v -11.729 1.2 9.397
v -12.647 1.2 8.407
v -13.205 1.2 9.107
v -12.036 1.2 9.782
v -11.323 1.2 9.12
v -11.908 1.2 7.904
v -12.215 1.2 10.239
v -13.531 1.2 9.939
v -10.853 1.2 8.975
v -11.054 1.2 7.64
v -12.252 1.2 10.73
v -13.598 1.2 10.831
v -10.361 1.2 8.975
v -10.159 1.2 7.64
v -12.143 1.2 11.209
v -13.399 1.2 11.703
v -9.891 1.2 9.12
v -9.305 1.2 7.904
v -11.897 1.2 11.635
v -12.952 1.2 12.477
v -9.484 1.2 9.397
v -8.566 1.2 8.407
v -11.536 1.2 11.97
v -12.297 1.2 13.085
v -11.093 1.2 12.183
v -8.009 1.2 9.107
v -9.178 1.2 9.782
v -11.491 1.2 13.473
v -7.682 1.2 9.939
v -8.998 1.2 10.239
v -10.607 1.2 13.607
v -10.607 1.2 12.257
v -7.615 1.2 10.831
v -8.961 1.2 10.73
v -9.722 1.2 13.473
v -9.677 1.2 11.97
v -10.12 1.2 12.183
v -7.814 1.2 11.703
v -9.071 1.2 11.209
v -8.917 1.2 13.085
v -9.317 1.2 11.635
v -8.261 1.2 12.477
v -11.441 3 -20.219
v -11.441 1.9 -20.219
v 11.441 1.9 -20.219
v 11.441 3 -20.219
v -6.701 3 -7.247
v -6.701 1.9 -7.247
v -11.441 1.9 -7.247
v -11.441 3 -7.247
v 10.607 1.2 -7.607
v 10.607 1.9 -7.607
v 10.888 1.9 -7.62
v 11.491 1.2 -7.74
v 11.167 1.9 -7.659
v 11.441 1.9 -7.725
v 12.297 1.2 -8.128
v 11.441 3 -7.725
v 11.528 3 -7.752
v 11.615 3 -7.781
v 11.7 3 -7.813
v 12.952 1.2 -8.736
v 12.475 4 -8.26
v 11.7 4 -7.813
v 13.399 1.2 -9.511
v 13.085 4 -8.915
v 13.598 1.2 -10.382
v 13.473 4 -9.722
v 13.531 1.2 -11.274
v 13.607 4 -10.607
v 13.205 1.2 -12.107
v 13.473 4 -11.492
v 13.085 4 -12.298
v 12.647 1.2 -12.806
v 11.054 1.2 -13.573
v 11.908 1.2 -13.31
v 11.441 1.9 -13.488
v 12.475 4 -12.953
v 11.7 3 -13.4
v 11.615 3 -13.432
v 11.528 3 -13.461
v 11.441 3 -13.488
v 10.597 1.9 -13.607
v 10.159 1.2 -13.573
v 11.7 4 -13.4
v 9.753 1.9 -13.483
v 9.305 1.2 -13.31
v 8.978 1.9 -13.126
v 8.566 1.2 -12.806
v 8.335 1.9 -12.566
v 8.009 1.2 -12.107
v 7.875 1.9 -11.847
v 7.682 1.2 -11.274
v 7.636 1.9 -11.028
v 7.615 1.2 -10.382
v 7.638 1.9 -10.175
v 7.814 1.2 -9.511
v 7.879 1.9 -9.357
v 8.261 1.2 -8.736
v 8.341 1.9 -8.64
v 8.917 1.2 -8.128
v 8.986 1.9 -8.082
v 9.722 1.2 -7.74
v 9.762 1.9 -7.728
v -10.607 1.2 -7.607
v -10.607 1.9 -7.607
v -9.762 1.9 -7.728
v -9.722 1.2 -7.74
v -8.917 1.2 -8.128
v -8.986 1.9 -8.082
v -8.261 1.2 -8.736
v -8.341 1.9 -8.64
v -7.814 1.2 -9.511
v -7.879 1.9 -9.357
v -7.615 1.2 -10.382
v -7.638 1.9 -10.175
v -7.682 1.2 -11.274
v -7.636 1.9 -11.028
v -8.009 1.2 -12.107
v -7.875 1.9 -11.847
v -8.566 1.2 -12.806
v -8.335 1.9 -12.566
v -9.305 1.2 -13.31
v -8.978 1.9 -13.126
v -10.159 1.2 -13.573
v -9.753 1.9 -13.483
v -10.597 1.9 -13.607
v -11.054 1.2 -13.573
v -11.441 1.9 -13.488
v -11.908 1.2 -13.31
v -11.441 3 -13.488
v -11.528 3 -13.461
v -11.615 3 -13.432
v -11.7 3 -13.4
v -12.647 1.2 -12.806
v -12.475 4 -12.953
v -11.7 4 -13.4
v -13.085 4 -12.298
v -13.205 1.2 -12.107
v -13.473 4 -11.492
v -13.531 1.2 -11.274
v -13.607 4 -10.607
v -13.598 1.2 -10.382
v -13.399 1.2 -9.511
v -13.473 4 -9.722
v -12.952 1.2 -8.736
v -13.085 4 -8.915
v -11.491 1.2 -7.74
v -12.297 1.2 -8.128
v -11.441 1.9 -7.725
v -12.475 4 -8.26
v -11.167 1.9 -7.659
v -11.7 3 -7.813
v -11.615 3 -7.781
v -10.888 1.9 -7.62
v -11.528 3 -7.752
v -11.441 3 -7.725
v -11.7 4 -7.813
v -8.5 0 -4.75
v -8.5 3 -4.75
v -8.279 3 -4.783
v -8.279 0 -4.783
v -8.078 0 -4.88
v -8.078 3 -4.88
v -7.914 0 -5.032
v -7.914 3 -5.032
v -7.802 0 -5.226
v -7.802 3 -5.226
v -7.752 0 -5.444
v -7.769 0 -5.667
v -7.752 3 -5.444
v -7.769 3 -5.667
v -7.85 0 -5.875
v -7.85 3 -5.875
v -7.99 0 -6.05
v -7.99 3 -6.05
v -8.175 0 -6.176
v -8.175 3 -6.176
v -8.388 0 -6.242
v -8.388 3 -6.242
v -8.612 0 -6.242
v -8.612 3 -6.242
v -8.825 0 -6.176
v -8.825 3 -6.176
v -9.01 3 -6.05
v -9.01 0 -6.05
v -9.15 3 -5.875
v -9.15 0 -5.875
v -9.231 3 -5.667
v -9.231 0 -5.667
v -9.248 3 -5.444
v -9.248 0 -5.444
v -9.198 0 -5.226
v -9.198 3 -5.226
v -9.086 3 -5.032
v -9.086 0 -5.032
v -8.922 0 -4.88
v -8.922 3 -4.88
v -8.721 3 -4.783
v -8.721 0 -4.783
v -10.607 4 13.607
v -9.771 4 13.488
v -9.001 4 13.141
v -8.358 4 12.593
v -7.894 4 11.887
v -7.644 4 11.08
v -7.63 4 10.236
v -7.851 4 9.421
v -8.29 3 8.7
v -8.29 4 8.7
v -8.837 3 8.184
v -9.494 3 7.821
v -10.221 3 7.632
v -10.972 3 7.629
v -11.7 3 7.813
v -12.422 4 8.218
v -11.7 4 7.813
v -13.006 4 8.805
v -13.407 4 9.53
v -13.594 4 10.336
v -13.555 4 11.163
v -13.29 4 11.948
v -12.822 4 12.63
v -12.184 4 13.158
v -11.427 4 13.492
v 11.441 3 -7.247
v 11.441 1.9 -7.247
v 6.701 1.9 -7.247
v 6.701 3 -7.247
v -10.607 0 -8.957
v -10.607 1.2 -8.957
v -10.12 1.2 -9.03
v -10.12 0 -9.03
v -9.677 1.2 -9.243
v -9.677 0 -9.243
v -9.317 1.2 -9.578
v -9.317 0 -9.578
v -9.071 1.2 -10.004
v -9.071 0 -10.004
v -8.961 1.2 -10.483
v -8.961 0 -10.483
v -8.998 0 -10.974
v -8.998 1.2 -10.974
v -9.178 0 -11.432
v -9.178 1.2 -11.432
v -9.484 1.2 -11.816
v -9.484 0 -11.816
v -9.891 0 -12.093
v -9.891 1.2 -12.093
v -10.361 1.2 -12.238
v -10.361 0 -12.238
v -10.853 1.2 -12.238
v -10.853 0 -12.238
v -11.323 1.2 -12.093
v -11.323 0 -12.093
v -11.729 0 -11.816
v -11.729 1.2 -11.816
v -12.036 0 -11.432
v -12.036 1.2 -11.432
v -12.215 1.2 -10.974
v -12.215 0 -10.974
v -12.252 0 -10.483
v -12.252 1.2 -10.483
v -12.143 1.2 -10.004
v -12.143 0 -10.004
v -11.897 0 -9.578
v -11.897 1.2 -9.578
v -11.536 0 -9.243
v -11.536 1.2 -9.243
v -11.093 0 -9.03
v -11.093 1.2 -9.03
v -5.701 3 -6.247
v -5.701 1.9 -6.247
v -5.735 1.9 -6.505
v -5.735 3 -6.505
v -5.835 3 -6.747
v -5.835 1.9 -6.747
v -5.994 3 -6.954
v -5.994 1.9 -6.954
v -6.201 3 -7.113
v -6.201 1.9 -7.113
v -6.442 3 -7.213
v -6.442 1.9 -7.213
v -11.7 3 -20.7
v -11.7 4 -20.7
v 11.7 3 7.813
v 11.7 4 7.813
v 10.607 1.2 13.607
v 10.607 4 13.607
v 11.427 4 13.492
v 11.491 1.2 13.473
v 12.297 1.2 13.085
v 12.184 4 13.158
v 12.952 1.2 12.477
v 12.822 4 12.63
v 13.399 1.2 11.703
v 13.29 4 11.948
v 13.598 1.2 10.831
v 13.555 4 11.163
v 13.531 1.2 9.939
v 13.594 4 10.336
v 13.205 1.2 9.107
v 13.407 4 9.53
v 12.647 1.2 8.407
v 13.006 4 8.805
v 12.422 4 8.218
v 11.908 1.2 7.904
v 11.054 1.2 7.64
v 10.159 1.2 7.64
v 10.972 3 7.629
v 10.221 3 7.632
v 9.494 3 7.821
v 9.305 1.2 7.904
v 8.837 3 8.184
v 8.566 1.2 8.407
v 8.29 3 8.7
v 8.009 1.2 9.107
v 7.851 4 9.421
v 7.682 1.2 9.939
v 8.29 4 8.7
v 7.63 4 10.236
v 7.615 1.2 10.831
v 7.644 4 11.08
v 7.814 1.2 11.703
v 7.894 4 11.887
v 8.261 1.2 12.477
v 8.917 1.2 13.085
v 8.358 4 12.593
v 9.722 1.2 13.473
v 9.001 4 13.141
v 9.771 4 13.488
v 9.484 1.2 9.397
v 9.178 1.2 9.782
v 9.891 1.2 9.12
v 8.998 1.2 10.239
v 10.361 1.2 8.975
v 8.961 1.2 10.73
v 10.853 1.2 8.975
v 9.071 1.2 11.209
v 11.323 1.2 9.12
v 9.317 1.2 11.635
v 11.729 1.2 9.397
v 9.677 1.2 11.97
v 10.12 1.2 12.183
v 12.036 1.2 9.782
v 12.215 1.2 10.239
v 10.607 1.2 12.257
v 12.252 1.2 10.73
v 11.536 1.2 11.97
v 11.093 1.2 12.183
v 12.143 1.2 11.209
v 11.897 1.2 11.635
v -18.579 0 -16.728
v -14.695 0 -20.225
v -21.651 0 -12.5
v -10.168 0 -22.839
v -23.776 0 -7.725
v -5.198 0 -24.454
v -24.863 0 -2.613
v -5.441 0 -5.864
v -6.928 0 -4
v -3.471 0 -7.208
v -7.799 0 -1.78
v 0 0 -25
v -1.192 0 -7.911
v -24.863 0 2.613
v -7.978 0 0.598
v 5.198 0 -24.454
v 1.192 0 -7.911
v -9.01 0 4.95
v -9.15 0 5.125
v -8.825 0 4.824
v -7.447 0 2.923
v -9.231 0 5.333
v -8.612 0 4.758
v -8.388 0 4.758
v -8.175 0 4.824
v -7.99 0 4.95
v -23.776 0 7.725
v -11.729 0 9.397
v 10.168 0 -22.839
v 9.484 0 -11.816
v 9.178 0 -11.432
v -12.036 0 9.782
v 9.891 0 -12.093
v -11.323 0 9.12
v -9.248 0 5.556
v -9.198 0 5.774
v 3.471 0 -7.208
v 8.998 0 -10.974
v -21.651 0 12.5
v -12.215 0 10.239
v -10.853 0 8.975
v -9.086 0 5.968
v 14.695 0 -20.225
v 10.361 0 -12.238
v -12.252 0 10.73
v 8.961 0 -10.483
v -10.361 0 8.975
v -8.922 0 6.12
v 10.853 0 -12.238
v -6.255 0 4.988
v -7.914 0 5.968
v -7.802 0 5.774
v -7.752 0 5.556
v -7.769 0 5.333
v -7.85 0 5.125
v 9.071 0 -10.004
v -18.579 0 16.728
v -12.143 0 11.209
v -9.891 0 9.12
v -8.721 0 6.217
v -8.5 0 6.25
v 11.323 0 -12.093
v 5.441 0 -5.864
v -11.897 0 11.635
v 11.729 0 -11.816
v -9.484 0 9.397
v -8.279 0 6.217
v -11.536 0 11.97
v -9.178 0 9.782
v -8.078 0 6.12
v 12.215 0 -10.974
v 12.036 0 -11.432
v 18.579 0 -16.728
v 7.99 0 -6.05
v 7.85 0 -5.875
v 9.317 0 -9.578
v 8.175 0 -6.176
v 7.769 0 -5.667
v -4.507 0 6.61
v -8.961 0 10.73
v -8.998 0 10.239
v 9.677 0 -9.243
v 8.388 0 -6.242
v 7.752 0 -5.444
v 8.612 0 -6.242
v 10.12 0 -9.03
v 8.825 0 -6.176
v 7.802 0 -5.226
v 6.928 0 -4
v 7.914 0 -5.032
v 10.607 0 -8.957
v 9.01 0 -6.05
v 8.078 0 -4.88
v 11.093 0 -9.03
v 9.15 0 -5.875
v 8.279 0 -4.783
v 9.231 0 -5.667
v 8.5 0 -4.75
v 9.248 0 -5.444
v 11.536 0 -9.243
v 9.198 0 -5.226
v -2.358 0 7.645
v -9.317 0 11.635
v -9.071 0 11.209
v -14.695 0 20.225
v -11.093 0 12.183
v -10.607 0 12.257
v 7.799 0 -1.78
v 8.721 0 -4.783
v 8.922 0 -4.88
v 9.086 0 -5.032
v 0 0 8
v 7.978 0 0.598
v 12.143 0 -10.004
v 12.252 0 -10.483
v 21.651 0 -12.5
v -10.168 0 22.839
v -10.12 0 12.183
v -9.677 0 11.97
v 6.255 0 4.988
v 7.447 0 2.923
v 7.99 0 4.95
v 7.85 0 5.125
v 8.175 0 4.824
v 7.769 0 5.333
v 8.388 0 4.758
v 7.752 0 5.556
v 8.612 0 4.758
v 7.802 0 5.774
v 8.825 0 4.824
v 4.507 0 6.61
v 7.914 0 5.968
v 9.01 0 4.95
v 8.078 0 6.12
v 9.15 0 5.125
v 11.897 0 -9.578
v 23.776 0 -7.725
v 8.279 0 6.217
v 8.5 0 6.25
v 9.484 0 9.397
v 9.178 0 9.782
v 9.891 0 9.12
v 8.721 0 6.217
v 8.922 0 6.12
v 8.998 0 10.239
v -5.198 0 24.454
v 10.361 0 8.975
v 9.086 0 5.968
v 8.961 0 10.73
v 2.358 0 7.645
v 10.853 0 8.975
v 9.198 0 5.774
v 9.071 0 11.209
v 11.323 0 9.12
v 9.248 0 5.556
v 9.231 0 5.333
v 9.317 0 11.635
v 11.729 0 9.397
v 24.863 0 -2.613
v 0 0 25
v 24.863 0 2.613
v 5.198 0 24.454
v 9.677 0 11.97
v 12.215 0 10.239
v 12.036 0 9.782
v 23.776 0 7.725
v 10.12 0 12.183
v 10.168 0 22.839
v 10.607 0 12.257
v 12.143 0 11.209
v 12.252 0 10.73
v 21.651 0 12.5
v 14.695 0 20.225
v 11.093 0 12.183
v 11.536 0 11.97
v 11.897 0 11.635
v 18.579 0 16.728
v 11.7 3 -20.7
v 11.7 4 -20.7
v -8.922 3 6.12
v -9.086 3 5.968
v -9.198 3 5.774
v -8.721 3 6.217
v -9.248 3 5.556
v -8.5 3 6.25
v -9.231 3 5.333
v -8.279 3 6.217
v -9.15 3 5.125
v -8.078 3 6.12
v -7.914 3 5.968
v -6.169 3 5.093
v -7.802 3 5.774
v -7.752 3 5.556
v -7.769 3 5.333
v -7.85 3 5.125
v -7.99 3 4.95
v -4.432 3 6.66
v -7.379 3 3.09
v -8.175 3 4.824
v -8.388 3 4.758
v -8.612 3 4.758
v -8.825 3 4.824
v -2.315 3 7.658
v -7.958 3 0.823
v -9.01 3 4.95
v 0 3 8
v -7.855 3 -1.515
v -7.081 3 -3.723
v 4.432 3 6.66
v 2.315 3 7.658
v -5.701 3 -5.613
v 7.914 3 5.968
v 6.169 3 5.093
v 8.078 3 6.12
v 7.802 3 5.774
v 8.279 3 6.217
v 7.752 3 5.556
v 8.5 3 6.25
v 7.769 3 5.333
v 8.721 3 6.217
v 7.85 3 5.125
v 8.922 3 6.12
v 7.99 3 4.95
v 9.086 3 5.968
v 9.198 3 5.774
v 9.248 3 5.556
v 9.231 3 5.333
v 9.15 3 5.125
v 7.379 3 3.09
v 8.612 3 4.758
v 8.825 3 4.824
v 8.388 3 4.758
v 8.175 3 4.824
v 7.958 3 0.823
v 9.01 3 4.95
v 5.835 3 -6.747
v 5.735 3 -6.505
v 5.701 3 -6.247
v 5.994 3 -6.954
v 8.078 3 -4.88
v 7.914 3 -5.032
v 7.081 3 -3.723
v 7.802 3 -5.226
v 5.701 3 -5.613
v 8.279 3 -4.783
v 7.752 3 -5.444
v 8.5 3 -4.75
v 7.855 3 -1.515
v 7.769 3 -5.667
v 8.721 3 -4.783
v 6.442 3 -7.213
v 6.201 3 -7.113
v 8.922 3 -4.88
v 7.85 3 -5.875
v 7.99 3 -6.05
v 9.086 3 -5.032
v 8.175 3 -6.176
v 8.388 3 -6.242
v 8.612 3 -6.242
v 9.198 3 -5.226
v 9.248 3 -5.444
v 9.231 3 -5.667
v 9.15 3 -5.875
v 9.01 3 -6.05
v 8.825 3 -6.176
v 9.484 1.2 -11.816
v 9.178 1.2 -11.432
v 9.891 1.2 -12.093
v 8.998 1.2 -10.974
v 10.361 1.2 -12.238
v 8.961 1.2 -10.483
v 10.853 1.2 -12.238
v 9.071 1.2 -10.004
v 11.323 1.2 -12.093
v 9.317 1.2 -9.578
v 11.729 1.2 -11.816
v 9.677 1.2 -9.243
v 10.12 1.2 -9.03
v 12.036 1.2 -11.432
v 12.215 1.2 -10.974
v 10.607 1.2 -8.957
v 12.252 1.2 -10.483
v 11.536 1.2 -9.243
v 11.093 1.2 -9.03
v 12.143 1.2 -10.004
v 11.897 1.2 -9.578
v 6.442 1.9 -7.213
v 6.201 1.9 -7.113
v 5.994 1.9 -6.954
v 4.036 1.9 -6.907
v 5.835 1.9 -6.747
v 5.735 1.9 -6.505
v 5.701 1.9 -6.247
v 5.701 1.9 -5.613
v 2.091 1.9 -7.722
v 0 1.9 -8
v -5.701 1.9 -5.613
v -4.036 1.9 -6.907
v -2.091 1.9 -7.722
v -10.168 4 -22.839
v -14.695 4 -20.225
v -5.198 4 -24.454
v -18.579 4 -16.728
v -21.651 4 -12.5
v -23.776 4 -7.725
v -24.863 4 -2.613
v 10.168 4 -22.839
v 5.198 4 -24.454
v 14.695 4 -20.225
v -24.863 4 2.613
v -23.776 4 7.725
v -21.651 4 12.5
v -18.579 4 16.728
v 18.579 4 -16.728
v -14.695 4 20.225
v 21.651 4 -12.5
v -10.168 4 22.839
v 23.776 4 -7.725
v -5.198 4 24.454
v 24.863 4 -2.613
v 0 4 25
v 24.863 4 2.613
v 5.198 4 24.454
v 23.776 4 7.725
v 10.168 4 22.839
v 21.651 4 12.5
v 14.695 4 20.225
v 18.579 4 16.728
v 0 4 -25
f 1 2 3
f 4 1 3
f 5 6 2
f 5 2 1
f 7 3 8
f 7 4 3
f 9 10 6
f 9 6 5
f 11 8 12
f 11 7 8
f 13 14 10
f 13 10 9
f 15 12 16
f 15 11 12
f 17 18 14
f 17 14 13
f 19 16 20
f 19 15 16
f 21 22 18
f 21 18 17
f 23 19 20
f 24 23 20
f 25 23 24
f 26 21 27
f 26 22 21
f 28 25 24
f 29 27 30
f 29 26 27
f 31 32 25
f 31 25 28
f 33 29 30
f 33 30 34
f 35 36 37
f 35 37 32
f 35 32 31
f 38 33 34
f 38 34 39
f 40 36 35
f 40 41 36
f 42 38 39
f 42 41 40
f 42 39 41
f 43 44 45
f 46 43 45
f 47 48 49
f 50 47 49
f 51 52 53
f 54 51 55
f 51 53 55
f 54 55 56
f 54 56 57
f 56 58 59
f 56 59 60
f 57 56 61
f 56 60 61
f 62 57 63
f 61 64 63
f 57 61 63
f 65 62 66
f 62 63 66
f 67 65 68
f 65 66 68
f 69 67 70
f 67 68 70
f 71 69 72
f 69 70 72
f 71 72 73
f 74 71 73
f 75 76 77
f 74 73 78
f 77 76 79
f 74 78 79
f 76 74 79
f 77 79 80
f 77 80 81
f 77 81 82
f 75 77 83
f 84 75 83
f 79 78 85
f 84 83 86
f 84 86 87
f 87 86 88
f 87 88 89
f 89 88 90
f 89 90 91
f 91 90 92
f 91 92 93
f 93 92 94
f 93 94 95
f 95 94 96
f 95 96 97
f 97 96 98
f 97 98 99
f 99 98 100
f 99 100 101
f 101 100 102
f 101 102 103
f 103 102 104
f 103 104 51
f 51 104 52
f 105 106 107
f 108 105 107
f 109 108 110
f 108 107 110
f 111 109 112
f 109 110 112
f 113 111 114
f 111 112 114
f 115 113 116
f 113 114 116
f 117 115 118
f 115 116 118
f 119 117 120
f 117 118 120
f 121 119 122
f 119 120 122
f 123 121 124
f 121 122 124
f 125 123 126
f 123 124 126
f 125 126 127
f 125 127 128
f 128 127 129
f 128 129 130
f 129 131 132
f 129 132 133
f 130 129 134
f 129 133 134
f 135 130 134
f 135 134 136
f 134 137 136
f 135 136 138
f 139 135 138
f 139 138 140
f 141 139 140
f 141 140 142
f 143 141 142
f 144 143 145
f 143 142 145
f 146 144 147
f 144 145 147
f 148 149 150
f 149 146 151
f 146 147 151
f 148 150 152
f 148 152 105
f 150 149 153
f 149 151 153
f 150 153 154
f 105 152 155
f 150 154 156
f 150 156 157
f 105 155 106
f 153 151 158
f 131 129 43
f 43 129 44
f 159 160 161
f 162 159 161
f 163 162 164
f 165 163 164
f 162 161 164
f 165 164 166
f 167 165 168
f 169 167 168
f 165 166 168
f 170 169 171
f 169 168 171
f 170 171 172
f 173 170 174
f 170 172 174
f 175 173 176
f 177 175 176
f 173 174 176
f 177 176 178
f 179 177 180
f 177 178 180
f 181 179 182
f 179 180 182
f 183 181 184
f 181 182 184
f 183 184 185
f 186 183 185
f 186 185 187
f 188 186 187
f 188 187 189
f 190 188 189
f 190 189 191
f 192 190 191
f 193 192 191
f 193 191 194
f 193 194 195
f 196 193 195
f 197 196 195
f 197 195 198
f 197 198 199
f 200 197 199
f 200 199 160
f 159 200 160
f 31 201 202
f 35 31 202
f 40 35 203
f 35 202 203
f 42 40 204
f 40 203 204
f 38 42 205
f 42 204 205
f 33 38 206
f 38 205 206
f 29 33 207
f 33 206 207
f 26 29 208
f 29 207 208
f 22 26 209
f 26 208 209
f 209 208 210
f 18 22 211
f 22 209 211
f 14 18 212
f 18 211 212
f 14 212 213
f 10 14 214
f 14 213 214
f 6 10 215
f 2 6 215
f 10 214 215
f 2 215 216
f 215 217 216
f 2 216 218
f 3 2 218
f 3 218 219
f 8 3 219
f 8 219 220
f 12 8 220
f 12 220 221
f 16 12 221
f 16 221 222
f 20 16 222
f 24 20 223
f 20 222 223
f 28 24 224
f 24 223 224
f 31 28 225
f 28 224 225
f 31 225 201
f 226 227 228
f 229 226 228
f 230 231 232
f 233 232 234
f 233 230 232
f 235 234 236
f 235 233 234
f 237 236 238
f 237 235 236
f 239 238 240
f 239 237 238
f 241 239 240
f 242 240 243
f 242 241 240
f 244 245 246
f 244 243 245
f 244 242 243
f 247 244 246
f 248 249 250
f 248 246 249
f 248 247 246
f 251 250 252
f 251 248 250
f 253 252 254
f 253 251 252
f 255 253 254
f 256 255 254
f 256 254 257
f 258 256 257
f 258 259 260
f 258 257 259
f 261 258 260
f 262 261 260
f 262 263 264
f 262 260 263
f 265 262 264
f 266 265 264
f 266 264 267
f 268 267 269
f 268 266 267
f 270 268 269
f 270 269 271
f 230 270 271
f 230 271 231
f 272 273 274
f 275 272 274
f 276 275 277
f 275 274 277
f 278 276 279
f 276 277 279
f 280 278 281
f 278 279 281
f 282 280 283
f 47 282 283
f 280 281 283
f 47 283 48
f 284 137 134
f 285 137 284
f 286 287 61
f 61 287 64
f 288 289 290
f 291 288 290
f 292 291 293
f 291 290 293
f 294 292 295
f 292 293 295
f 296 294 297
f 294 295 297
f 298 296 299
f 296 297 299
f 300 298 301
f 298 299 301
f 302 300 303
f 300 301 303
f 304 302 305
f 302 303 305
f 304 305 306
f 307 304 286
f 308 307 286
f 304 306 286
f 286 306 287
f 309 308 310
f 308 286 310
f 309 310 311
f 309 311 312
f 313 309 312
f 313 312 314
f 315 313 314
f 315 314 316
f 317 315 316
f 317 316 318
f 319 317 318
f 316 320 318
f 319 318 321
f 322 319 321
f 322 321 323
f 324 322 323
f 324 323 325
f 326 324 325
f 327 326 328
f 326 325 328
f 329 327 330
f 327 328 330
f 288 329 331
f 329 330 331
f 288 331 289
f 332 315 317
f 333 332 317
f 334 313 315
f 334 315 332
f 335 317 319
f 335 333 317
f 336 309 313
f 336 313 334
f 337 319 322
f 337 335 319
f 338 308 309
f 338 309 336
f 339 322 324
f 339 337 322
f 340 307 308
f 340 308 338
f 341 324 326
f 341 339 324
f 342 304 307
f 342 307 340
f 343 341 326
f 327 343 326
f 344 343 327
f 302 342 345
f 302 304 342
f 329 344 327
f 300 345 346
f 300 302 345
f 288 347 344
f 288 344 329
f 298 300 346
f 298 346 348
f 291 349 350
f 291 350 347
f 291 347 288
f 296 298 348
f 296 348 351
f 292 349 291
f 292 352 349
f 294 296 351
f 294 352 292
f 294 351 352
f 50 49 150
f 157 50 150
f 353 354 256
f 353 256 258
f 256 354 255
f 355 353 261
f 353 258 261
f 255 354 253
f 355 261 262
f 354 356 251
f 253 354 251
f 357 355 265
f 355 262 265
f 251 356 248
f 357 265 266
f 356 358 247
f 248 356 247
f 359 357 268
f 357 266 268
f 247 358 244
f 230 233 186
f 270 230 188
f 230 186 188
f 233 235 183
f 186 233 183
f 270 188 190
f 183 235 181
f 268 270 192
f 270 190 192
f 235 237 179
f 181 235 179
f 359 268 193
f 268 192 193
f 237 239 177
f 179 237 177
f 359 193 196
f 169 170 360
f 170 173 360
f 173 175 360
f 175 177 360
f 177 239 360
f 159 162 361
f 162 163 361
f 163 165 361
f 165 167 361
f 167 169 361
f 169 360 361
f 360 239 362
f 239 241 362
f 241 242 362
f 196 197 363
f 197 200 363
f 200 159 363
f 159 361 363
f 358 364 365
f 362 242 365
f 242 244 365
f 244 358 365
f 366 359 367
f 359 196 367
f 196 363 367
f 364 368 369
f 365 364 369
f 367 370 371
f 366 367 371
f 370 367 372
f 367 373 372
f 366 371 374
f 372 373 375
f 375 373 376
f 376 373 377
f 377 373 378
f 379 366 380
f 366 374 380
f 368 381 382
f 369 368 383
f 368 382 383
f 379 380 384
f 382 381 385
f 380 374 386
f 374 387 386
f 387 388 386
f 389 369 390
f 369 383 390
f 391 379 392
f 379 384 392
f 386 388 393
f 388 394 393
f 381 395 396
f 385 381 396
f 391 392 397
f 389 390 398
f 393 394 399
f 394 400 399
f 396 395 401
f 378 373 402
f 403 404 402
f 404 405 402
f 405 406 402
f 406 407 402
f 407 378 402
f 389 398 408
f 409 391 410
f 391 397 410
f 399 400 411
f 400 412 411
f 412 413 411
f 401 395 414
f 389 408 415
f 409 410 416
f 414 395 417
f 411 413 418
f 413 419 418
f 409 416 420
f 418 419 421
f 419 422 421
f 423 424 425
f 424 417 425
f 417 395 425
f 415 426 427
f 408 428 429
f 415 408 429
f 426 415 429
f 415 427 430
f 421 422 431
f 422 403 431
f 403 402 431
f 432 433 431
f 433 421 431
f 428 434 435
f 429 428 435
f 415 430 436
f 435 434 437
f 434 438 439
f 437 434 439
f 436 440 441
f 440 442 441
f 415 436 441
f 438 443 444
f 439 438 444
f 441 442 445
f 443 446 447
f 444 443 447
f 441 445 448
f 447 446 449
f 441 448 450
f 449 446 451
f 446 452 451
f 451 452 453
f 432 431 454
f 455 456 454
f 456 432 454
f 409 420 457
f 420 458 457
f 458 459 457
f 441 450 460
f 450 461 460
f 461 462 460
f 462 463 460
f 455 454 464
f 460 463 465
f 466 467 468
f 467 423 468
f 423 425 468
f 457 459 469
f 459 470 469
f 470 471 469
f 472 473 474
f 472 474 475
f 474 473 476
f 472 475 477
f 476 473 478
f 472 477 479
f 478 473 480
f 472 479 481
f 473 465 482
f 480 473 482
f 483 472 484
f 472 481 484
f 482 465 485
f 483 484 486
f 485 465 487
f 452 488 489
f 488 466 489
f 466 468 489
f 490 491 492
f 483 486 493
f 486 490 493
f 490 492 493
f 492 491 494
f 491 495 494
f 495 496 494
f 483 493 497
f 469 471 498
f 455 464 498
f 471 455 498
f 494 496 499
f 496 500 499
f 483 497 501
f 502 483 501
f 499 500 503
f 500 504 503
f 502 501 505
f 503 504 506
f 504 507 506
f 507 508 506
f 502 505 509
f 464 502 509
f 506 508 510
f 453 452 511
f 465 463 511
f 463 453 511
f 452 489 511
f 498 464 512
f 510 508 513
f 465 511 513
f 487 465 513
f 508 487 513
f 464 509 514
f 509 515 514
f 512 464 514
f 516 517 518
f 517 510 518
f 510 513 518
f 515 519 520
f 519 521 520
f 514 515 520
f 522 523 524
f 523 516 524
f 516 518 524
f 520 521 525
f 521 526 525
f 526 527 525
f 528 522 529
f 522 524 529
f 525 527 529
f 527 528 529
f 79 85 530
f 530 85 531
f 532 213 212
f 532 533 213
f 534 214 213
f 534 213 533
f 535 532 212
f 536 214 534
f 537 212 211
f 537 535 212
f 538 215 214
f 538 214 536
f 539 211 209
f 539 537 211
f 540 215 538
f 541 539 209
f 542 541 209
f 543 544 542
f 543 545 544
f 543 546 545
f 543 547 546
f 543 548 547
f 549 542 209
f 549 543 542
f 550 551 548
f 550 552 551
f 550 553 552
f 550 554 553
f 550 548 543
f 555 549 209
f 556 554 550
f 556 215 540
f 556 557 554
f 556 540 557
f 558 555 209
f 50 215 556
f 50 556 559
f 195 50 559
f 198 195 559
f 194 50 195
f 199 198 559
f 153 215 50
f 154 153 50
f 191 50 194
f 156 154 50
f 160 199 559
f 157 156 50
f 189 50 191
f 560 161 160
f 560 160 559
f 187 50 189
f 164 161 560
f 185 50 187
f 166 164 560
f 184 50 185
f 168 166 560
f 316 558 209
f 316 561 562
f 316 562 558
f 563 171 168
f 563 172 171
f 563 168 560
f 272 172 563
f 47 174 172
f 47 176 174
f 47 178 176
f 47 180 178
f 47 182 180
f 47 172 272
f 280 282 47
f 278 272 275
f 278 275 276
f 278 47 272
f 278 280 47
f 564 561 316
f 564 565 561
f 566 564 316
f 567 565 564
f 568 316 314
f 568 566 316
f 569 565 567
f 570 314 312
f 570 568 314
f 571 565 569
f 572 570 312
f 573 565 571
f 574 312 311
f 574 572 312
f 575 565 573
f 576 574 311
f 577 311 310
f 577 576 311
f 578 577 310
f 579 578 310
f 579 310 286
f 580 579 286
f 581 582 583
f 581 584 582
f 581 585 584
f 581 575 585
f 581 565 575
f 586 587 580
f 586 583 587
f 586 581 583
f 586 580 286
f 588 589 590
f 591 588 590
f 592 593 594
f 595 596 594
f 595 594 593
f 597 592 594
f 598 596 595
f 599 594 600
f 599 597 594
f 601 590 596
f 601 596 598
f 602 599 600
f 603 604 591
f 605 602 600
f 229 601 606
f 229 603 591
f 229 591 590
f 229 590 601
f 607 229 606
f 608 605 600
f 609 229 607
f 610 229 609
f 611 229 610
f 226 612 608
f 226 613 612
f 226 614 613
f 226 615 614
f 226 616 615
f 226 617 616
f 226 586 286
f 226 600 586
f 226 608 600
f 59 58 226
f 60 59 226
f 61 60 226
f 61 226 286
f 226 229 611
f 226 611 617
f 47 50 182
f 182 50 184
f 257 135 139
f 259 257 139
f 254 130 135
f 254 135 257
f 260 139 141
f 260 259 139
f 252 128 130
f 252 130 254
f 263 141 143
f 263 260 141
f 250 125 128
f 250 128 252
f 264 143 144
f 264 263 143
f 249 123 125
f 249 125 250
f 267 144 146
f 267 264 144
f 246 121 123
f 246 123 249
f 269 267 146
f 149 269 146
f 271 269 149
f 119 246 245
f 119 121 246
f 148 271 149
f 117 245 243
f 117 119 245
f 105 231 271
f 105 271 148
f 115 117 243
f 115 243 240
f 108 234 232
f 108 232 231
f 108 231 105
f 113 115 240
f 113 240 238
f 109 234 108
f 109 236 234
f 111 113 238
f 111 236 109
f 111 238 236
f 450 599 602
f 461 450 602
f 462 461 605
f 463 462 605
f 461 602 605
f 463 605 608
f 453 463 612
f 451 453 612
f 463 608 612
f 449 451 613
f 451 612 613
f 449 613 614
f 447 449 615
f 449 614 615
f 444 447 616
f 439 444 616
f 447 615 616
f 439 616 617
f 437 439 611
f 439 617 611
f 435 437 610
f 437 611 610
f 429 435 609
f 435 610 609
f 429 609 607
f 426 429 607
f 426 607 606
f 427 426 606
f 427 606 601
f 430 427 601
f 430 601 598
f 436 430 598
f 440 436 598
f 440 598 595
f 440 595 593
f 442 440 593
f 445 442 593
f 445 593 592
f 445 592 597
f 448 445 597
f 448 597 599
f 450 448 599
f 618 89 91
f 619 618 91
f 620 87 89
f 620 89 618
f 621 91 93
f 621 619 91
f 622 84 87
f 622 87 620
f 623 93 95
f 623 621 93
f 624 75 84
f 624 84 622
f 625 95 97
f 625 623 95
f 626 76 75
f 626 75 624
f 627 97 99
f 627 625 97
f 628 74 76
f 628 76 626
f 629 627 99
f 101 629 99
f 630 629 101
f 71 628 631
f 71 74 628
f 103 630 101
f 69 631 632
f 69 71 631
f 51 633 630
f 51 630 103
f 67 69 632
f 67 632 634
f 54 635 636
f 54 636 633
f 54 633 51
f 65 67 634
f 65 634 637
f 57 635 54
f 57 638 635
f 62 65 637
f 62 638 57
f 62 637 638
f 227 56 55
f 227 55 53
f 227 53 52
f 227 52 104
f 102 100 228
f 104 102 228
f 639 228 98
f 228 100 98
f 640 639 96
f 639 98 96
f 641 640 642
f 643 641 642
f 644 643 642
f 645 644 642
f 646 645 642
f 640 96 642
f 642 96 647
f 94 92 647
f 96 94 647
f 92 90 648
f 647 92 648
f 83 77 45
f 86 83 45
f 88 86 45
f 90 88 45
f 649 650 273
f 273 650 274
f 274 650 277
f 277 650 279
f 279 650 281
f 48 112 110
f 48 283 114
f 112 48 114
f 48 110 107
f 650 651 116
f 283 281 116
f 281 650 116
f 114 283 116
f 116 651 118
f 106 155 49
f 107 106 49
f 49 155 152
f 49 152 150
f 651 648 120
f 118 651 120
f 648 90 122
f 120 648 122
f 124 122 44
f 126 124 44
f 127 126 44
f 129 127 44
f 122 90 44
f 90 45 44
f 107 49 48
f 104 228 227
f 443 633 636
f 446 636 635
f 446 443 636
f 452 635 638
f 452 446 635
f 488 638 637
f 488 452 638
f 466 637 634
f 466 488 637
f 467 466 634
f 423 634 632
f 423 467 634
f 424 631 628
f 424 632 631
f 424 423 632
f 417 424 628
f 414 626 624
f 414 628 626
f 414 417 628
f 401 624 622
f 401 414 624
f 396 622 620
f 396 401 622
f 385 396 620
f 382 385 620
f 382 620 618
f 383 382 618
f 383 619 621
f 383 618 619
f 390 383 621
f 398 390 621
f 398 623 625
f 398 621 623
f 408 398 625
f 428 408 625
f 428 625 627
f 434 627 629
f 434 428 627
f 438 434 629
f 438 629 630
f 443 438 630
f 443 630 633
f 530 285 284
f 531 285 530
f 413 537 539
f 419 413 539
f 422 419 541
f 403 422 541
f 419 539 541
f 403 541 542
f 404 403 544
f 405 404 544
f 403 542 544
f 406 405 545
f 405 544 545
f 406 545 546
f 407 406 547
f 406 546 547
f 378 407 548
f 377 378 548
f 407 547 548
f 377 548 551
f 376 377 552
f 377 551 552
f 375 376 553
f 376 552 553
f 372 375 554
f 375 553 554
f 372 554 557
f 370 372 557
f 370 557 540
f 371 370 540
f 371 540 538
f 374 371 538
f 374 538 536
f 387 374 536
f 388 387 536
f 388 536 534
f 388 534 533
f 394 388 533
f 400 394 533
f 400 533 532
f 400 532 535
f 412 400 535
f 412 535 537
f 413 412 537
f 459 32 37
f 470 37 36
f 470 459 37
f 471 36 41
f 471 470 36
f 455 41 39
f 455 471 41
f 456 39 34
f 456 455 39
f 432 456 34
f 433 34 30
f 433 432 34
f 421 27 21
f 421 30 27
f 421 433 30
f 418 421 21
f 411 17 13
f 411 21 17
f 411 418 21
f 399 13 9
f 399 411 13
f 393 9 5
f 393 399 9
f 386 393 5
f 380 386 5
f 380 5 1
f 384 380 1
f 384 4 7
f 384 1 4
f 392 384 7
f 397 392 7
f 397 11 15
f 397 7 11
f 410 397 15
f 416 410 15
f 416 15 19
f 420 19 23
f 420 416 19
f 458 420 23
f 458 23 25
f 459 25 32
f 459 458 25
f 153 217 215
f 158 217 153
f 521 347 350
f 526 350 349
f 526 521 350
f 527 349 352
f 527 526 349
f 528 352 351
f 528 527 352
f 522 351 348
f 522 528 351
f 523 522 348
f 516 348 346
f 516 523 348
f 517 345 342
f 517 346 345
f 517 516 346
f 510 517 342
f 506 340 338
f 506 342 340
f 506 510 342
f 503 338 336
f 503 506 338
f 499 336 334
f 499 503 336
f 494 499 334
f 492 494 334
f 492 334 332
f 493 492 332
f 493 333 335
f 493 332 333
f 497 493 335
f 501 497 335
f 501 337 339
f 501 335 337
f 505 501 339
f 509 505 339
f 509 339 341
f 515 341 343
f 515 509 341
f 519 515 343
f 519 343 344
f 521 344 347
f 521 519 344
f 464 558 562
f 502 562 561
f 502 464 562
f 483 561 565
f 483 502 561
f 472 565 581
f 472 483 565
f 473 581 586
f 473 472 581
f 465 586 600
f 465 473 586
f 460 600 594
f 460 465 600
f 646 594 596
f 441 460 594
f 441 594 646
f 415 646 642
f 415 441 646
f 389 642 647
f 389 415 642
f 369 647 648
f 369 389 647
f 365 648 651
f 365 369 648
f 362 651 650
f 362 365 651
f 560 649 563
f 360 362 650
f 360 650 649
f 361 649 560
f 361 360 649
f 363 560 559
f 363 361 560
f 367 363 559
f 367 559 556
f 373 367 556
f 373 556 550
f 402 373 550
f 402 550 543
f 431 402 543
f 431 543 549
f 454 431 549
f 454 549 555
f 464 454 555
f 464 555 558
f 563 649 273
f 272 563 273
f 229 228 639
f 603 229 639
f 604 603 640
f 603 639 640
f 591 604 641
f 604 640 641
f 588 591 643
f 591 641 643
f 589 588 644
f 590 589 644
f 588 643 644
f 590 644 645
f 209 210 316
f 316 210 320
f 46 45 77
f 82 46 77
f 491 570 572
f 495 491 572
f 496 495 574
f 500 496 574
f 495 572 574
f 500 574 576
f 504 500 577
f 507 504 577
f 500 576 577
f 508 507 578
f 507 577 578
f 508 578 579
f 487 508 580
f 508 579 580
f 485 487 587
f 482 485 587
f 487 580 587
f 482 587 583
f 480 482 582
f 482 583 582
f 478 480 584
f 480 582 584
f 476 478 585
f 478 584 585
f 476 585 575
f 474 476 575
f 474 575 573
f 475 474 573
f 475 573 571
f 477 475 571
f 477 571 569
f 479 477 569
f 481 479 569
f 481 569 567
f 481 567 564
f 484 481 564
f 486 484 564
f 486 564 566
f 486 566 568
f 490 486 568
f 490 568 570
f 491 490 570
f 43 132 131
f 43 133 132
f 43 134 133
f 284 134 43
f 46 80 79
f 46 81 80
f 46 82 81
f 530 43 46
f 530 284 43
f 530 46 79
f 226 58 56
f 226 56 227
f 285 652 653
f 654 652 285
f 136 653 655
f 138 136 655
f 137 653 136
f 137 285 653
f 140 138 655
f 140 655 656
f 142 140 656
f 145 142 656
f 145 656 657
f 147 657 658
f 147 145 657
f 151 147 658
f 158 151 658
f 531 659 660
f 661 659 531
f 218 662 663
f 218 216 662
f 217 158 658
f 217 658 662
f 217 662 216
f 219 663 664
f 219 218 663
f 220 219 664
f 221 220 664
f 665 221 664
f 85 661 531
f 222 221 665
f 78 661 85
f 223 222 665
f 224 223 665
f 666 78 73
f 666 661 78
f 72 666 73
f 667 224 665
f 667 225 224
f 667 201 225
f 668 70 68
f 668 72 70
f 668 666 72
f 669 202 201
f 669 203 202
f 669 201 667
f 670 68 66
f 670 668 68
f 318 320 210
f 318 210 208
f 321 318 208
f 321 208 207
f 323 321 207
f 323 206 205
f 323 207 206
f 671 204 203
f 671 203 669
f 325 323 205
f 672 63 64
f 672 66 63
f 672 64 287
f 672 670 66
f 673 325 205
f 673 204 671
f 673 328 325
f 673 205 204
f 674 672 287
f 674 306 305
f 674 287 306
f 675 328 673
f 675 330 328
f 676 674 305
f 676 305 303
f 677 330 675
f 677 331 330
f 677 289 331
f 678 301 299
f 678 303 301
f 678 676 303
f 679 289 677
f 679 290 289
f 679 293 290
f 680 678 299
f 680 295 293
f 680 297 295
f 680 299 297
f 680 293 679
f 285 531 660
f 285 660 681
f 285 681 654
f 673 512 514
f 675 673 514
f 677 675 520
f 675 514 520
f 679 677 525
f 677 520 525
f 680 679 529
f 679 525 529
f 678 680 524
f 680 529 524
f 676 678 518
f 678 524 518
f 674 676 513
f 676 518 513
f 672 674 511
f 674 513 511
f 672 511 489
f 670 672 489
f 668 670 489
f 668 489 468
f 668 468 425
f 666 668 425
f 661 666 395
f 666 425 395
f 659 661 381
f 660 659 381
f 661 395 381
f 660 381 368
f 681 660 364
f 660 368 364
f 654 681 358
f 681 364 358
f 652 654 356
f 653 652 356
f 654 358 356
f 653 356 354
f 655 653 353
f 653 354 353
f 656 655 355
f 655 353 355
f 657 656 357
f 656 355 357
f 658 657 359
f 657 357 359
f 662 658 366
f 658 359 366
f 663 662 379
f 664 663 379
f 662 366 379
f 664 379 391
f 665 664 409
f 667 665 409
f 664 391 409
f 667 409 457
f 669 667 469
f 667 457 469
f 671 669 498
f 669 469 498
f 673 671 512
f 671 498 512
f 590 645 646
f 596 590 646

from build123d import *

# Parameters (mm, degrees)
SKETCH_1_R          = 25
SKETCH_1_R_2        = 8
SKETCH_1_R_3        = 1.65
EXTRUDE_1_DEPTH     = 4
SKETCH_5_W          = 23.4
SKETCH_5_H          = 29.4
CUT_EXTRUDE_1_DEPTH = 1
SKETCH_6_R          = 3
CUT_EXTRUDE_2_DEPTH = 2.8
CUT_EXTRUDE_3_REACH = 37.482
SKETCH_9_R          = 0.75
CUT_EXTRUDE_START   = -1.1
CUT_EXTRUDE_4_DEPTH = 1.1


with BuildPart() as part:
    # 草图1 → 凸台-拉伸1 (new body)
    with BuildSketch(Plane(origin=(0, 0, 0), x_dir=(1, 0, 0), z_dir=(0, 1, 0))):
        with Locations(Location((0, 0, 0), (0, 0, 270))):
            Circle(SKETCH_1_R)
        with Locations(Location((0, 0, 0), (0, 0, 270))):
            Circle(SKETCH_1_R_2, mode=Mode.SUBTRACT)
        with Locations(Location((10.606601718, 10.606601718, 0), (0, 0, 270))):
            Circle(SKETCH_1_R_3, mode=Mode.SUBTRACT)
        with Locations(Location((-10.606601718, 10.606601718, 0), (0, 0, 270))):
            Circle(SKETCH_1_R_3, mode=Mode.SUBTRACT)
        with Locations(Location((-10.606601718, -10.606601718, 0), (0, 0, 270))):
            Circle(SKETCH_1_R_3, mode=Mode.SUBTRACT)
        with Locations(Location((10.606601718, -10.606601718, 0), (0, 0, 270))):
            Circle(SKETCH_1_R_3, mode=Mode.SUBTRACT)
    extrude(amount=EXTRUDE_1_DEPTH)

    # 草图5 → 切除-拉伸1 (cut)
    with BuildSketch(Plane(origin=(0, 4, 0), x_dir=(1, 0, 0), z_dir=(0, 1, 0))):
        with Locations((0, 6)):
            Rectangle(SKETCH_5_W, SKETCH_5_H)
    extrude(amount=-CUT_EXTRUDE_1_DEPTH, mode=Mode.SUBTRACT)

    # 草图6 → 切除-拉伸2 (cut)
    with BuildSketch(Plane(origin=(0, 4, 0), x_dir=(1, 0, 0), z_dir=(0, 1, 0))):
        with Locations(Location((-10.606601718, 10.606601718, 0), (0, 0, 270))):
            Circle(SKETCH_6_R)
        with Locations(Location((10.606601718, 10.606601718, 0), (0, 0, 270))):
            Circle(SKETCH_6_R)
        with Locations(Location((10.606601718, -10.606601718, 0), (0, 0, 270))):
            Circle(SKETCH_6_R)
        with Locations(Location((-10.606601718, -10.606601718, 0), (0, 0, 270))):
            Circle(SKETCH_6_R)
    extrude(amount=-CUT_EXTRUDE_2_DEPTH, mode=Mode.SUBTRACT)

    # 草图9 → 切除-拉伸3 (cut, up to next)
    with BuildSketch(Plane(origin=(0, 3, 0), x_dir=(1, 0, 0), z_dir=(0, 1, 0)), mode=Mode.PRIVATE) as cut_extrude_3_sk1:
        with Locations(Location((-8.5, 5.5, 0), (0, 0, 270))):
            Circle(SKETCH_9_R)
    cut_extrude_3_tool1 = extrude(cut_extrude_3_sk1.sketch, amount=-CUT_EXTRUDE_3_REACH, mode=Mode.PRIVATE) & part.part
    # 草图9 → 切除-拉伸3 (cut, up to next)
    with BuildSketch(Plane(origin=(0, 3, 0), x_dir=(1, 0, 0), z_dir=(0, 1, 0)), mode=Mode.PRIVATE) as cut_extrude_3_sk2:
        with Locations(Location((8.5, 5.5, 0), (0, 0, 270))):
            Circle(SKETCH_9_R)
    cut_extrude_3_tool2 = extrude(cut_extrude_3_sk2.sketch, amount=-CUT_EXTRUDE_3_REACH, mode=Mode.PRIVATE) & part.part
    # 草图9 → 切除-拉伸3 (cut, up to next)
    with BuildSketch(Plane(origin=(0, 3, 0), x_dir=(1, 0, 0), z_dir=(0, 1, 0)), mode=Mode.PRIVATE) as cut_extrude_3_sk3:
        with Locations(Location((8.5, -5.5, 0), (0, 0, 270))):
            Circle(SKETCH_9_R)
    cut_extrude_3_tool3 = extrude(cut_extrude_3_sk3.sketch, amount=-CUT_EXTRUDE_3_REACH, mode=Mode.PRIVATE) & part.part
    # 草图9 → 切除-拉伸3 (cut, up to next)
    with BuildSketch(Plane(origin=(0, 3, 0), x_dir=(1, 0, 0), z_dir=(0, 1, 0)), mode=Mode.PRIVATE) as cut_extrude_3_sk4:
        with Locations(Location((-8.5, -5.5, 0), (0, 0, 270))):
            Circle(SKETCH_9_R)
    cut_extrude_3_tool4 = extrude(cut_extrude_3_sk4.sketch, amount=-CUT_EXTRUDE_3_REACH, mode=Mode.PRIVATE) & part.part
    add(cut_extrude_3_tool1.solids().sort_by_distance((-8.5, 3, -5.5))[0], mode=Mode.SUBTRACT)
    add(cut_extrude_3_tool2.solids().sort_by_distance((8.5, 3, -5.5))[0], mode=Mode.SUBTRACT)
    add(cut_extrude_3_tool3.solids().sort_by_distance((8.5, 3, 5.5))[0], mode=Mode.SUBTRACT)
    add(cut_extrude_3_tool4.solids().sort_by_distance((-8.5, 3, 5.5))[0], mode=Mode.SUBTRACT)

    # 草图10 → 切除-拉伸4 (cut)
    with BuildSketch(Plane(origin=(0, 3, 0), x_dir=(1, 0, 0), z_dir=(0, 1, 0)).offset(CUT_EXTRUDE_START)):
        with BuildLine():
            Line((-5.700788223, 5.612576381), (-5.700788223, 6.246626792))
            ThreePointArc((-5.700788223, 6.246626792), (-5.993681442, 6.953733574), (-6.700788223, 7.246626792))
            Line((-6.700788223, 7.246626792), (-11.441421376, 7.246626792))
            Line((-11.441421376, 7.246626792), (-11.441421376, 20.219080974))
            Line((-11.441421376, 20.219080974), (11.441421376, 20.219080974))
            Line((11.441421376, 20.219080974), (11.441421376, 7.246626792))
            Line((11.441421376, 7.246626792), (6.700788223, 7.246626792))
            ThreePointArc((6.700788223, 7.246626792), (5.993681442, 6.953733574), (5.700788223, 6.246626792))
            Line((5.700788223, 6.246626792), (5.700788223, 5.612576381))
            ThreePointArc((5.700788223, 5.612576381), (0, 8), (-5.700788223, 5.612576381))
        make_face()
    extrude(amount=CUT_EXTRUDE_4_DEPTH, mode=Mode.SUBTRACT)


solid = part.part
